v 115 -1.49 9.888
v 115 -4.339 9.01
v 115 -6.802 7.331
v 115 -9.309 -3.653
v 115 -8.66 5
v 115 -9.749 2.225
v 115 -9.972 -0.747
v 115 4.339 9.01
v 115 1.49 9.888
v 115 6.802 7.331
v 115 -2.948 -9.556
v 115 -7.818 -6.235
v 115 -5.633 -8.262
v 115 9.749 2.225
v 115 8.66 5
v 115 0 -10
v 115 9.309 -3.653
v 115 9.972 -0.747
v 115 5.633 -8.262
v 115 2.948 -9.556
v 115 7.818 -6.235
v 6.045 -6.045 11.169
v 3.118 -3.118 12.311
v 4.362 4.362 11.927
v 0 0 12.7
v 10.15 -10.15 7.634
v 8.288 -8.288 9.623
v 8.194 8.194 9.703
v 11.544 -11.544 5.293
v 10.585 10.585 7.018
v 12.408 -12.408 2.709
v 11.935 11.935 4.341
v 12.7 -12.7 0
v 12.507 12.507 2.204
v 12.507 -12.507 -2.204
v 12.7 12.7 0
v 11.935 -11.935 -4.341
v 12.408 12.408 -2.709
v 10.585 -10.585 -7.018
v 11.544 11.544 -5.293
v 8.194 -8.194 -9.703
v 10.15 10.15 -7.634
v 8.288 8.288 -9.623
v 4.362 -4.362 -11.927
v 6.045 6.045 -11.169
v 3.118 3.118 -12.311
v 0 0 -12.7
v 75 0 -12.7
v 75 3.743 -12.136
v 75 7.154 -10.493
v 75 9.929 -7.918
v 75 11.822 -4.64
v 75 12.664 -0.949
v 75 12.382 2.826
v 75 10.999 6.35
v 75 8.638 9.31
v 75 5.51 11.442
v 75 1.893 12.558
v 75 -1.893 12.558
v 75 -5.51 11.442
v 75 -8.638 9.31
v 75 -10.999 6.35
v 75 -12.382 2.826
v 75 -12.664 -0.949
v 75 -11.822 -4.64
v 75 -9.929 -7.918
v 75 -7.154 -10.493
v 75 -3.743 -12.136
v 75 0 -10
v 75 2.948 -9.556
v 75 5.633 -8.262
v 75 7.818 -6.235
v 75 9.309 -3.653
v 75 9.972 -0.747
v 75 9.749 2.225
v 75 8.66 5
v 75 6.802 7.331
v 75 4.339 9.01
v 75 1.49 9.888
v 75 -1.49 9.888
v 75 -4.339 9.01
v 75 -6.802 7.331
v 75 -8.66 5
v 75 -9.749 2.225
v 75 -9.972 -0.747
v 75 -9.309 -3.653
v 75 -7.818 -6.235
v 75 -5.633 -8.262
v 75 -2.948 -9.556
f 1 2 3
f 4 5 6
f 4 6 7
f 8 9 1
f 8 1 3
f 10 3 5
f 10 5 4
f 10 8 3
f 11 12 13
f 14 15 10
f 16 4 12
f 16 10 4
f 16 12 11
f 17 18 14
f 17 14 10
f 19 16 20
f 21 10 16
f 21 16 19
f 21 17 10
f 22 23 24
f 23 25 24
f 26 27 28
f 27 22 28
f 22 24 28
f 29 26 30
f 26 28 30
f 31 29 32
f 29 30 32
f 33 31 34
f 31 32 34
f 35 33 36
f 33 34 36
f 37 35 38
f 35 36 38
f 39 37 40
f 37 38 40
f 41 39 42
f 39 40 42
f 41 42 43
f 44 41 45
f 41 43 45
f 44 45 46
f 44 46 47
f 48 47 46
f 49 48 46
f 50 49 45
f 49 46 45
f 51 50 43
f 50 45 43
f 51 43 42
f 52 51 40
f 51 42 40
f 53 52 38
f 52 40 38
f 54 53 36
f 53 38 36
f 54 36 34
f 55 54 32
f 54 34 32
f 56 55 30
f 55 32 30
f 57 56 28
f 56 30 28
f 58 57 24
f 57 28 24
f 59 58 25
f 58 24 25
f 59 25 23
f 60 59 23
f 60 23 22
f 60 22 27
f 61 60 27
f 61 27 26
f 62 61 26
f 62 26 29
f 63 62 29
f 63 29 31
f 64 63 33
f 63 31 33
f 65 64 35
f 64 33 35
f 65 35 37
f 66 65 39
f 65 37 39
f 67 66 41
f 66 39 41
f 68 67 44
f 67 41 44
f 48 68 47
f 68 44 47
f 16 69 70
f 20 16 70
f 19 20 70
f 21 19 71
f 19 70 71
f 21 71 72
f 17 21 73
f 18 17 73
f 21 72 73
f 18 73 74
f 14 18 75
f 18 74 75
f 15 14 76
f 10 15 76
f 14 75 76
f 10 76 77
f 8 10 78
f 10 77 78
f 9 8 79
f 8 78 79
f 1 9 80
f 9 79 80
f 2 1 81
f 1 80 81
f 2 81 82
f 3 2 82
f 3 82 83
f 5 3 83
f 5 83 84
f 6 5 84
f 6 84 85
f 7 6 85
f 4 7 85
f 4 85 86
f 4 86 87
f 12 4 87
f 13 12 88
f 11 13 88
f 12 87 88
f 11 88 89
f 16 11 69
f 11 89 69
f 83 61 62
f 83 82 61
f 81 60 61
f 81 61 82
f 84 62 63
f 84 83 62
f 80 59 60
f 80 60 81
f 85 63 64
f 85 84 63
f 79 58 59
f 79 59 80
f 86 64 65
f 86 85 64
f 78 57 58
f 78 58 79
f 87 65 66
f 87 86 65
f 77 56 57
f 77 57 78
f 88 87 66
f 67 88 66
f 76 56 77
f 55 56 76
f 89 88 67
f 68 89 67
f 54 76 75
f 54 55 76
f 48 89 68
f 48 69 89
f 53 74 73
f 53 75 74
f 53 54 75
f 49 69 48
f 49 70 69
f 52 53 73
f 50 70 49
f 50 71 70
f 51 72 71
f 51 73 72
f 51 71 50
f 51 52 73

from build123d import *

# Parameters (mm, degrees)
SKETCH1_R           = 12.7
BOSS_EXTRUDE1_DEPTH = 75
SKETCH5_R           = 12.7
CUT_EXTRUDE1_DEPTH  = 37.5
SKETCH2_R           = 10
BOSS_EXTRUDE2_DEPTH = 40


with BuildPart() as part:
    # Sketch1 → Boss-Extrude1 (new body)
    with BuildSketch(Plane(origin=(0, 0, 0), x_dir=(0, 0, -1), z_dir=(1, 0, 0))):
        Circle(SKETCH1_R)
    extrude(amount=BOSS_EXTRUDE1_DEPTH)

    # Sketch5 → Cut-Extrude1 (cut, symmetric)
    with BuildSketch(Plane(origin=(0, 0, 0), x_dir=(1, 0, 0), z_dir=(0, 1, 0))):
        Circle(SKETCH5_R)
    extrude(amount=CUT_EXTRUDE1_DEPTH, both=True, mode=Mode.SUBTRACT)

    # Sketch2 → Boss-Extrude2 (add)
    with BuildSketch(Plane(origin=(75, 0, 0), x_dir=(0, 0, -1), z_dir=(1, 0, 0))):
        Circle(SKETCH2_R)
    extrude(amount=BOSS_EXTRUDE2_DEPTH)


solid = part.part
